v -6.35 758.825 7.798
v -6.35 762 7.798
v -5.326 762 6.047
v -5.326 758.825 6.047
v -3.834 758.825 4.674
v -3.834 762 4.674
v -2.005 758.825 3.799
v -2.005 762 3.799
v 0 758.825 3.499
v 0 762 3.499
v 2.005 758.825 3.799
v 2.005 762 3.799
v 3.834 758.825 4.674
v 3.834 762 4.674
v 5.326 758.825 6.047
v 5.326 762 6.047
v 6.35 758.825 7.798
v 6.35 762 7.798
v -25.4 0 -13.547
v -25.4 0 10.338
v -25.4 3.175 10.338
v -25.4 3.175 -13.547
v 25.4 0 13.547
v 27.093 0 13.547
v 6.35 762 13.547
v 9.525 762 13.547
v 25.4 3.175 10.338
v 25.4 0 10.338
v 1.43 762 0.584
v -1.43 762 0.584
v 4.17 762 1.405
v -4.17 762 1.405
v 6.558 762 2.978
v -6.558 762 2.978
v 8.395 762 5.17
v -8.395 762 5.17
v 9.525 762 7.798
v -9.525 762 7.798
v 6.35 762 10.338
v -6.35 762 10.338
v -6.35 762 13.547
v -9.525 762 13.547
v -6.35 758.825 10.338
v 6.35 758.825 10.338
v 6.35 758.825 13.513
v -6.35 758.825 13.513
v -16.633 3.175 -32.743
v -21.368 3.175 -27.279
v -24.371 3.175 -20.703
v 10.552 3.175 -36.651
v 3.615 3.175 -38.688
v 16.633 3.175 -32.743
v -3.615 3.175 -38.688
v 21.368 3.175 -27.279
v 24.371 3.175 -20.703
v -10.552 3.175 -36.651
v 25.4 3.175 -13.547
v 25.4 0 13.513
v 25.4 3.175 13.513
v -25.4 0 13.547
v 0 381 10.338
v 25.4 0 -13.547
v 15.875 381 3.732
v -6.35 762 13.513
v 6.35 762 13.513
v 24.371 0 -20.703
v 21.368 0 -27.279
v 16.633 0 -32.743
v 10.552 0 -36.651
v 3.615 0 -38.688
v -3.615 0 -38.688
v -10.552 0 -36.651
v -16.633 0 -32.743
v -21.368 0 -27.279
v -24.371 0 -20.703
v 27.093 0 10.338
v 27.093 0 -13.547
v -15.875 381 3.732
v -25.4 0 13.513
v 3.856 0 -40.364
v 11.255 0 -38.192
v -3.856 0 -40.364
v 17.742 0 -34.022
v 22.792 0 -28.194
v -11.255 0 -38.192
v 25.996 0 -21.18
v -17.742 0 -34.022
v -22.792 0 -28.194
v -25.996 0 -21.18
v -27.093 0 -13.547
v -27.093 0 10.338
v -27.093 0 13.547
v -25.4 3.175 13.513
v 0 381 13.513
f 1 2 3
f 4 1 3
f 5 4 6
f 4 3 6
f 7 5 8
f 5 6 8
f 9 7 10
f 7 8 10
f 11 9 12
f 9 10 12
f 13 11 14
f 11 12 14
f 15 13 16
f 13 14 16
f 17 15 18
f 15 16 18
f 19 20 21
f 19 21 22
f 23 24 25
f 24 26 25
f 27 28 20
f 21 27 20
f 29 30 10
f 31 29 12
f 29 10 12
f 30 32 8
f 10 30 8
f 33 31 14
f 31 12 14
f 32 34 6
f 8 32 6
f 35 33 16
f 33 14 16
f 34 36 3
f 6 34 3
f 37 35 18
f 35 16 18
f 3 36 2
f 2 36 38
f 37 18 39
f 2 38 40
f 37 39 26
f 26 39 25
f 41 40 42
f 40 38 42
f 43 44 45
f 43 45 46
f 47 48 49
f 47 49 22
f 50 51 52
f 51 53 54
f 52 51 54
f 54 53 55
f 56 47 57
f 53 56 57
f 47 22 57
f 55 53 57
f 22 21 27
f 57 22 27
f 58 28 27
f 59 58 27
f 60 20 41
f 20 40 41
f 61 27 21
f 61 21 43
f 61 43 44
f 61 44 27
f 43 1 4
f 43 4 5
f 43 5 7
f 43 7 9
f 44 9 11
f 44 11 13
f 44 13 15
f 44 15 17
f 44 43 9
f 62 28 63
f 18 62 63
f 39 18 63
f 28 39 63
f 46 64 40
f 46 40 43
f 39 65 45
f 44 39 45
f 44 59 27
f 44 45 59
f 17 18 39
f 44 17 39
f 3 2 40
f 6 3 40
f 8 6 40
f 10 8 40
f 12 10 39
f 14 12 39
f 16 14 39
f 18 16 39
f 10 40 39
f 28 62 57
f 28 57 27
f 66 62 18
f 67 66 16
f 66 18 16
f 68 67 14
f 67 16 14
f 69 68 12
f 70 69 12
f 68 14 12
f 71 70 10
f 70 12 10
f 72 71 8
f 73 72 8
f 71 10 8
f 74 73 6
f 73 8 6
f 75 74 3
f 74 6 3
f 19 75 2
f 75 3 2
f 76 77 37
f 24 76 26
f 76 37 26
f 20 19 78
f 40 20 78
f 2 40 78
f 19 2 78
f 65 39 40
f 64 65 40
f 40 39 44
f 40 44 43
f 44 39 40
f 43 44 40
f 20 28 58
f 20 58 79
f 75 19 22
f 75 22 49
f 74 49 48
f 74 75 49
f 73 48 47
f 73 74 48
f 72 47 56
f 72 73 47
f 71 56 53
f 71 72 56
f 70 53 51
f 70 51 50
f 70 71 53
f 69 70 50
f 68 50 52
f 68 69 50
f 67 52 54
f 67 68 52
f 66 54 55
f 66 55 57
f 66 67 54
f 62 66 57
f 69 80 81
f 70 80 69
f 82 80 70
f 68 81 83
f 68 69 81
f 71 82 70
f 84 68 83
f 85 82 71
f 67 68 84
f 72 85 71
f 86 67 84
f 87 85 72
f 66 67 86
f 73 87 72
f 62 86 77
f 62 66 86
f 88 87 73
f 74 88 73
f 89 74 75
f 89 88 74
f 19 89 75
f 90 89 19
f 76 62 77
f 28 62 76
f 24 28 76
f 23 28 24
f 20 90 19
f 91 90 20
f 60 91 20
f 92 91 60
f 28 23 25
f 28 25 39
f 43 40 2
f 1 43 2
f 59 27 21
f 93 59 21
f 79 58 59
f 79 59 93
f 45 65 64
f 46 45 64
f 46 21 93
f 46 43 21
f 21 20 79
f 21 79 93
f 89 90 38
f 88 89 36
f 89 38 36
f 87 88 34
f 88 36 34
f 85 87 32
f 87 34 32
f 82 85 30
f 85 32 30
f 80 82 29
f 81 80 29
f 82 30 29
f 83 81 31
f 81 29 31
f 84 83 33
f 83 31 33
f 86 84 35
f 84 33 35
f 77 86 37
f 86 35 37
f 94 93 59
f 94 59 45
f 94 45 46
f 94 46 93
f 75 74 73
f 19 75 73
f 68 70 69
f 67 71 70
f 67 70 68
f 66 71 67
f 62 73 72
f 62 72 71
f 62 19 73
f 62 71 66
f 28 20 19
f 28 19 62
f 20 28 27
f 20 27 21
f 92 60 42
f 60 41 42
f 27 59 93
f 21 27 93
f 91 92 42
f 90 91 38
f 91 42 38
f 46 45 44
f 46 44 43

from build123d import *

# Parameters (mm, degrees)
F1_DEPTH  = 3.175
F0_W      = 1.6933333333
F0_H      = 3.2089926077
F3_W      = 3.175
F3_H      = 3.2089926077
F7_DEPTH  = 3.175
F8_DEPTH  = 3.175
F9_DEPTH  = 3.175
F9_FACE_W = 50.8
F9_FACE_H = 3.175
F8_FACE_W = 12.7
F8_FACE_H = 3.175


with BuildPart() as f1:
    # F0 (on Front) → F1 (new body)
    with BuildSketch(Plane.XZ):
        with BuildLine():
            Line((25.4, -13.5466666667), (25.4, 10.337674059))
            Line((25.4, 10.337674059), (-25.4, 10.337674059))
            Line((-25.4, 10.337674059), (-25.4, -13.5466666667))
            ThreePointArc((-25.4, -13.5466666667), (0, -38.9466666667), (25.4, -13.5466666667))
        make_face()
    extrude(amount=-F1_DEPTH)


with BuildPart() as f4:
    # F0 (on Front) → F4 section 0
    with BuildSketch(Plane.XZ):
        with BuildLine():
            ThreePointArc((-27.0933333333, -13.5466666667), (0, -40.64), (27.0933333333, -13.5466666667))
            Line((27.0933333333, -13.5466666667), (27.0933333333, 10.337674059))
            Line((27.0933333333, 10.337674059), (25.4, 10.337674059))
            Line((25.4, 10.337674059), (25.4, -13.5466666667))
            ThreePointArc((25.4, -13.5466666667), (0, -38.9466666667), (-25.4, -13.5466666667))
            Line((-25.4, -13.5466666667), (-25.4, 10.337674059))
            Line((-25.4, 10.337674059), (-27.0933333333, 10.337674059))
            Line((-27.0933333333, 10.337674059), (-27.0933333333, -13.5466666667))
        make_face()
    # F3 (on offset) → F4 section 1
    with BuildSketch(Plane.XZ.offset(-762)):
        with BuildLine():
            Line((-6.35, 10.337674059), (-9.525, 10.337674059))
            Line((-9.525, 10.337674059), (-9.525, 7.797674059))
            ThreePointArc((-9.525, 7.797674059), (0, 0.4798231268), (9.525, 7.797674059))
            Line((9.525, 7.797674059), (9.525, 10.337674059))
            Line((9.525, 10.337674059), (6.35, 10.337674059))
            Line((6.35, 10.337674059), (6.35, 7.797674059))
            ThreePointArc((6.35, 7.797674059), (0, 3.4985147539), (-6.35, 7.797674059))
            Line((-6.35, 7.797674059), (-6.35, 10.337674059))
        make_face()
    loft()

    # F0 (on Front) → F5 section 0
    with BuildSketch(Plane.XZ):
        with Locations((-26.2466666667, 11.9421703628)):
            Rectangle(F0_W, F0_H)
    # F3 (on offset) → F5 section 1
    with BuildSketch(Plane.XZ.offset(-762)):
        with Locations((-7.9375, 11.9421703628)):
            Rectangle(F3_W, F3_H)
    loft()

    # F0 (on Front) → F6 section 0
    with BuildSketch(Plane.XZ):
        with Locations((26.2466666667, 11.9421703628)):
            Rectangle(F0_W, F0_H)
    # F3 (on offset) → F6 section 1
    with BuildSketch(Plane.XZ.offset(-762)):
        with Locations((7.9375, 11.9421703628)):
            Rectangle(F3_W, F3_H)
    loft()


with BuildPart() as f7:
    # F3 (on offset) → F7 (new body)
    with BuildSketch(Plane.XZ.offset(-762)):
        with BuildLine():
            Line((6.35, 10.337674059), (-6.35, 10.337674059))
            Line((-6.35, 10.337674059), (-6.35, 7.797674059))
            ThreePointArc((-6.35, 7.797674059), (0, 3.4985147539), (6.35, 7.797674059))
            Line((6.35, 7.797674059), (6.35, 10.337674059))
        make_face()
    extrude(amount=F7_DEPTH)


with BuildPart() as f8:
    # F8 (new): a face of the model
    f8_faces = [f7.part.faces().sort_by_distance(p)[0] for p in [
        (0, 760.4125, 10.337674059),
    ]]
    extrude(f8_faces, amount=F8_DEPTH)


with BuildPart() as f9:
    # F9 (new): a face of the model
    f9_faces = [f1.part.faces().sort_by_distance(p)[0] for p in [
        (0, 1.5875, 10.337674059),
    ]]
    extrude(f9_faces, amount=F9_DEPTH)


with BuildPart() as f10:
    # F9_face (on face) → F10 section 0
    with BuildSketch(Plane(origin=(0, 3.175, 11.925174059), x_dir=(-1, 0, 0), z_dir=(0, 1, 0))):
        Rectangle(F9_FACE_W, F9_FACE_H)
    # F8_face (on face) → F10 section 1
    with BuildSketch(Plane(origin=(0, 758.825, 11.925174059), x_dir=(1, 0, 0), z_dir=(0, -1, 0))):
        Rectangle(F8_FACE_W, F8_FACE_H)
    loft()


solid = Compound([f1.part, f4.part, f7.part, f8.part, f9.part, f10.part])
